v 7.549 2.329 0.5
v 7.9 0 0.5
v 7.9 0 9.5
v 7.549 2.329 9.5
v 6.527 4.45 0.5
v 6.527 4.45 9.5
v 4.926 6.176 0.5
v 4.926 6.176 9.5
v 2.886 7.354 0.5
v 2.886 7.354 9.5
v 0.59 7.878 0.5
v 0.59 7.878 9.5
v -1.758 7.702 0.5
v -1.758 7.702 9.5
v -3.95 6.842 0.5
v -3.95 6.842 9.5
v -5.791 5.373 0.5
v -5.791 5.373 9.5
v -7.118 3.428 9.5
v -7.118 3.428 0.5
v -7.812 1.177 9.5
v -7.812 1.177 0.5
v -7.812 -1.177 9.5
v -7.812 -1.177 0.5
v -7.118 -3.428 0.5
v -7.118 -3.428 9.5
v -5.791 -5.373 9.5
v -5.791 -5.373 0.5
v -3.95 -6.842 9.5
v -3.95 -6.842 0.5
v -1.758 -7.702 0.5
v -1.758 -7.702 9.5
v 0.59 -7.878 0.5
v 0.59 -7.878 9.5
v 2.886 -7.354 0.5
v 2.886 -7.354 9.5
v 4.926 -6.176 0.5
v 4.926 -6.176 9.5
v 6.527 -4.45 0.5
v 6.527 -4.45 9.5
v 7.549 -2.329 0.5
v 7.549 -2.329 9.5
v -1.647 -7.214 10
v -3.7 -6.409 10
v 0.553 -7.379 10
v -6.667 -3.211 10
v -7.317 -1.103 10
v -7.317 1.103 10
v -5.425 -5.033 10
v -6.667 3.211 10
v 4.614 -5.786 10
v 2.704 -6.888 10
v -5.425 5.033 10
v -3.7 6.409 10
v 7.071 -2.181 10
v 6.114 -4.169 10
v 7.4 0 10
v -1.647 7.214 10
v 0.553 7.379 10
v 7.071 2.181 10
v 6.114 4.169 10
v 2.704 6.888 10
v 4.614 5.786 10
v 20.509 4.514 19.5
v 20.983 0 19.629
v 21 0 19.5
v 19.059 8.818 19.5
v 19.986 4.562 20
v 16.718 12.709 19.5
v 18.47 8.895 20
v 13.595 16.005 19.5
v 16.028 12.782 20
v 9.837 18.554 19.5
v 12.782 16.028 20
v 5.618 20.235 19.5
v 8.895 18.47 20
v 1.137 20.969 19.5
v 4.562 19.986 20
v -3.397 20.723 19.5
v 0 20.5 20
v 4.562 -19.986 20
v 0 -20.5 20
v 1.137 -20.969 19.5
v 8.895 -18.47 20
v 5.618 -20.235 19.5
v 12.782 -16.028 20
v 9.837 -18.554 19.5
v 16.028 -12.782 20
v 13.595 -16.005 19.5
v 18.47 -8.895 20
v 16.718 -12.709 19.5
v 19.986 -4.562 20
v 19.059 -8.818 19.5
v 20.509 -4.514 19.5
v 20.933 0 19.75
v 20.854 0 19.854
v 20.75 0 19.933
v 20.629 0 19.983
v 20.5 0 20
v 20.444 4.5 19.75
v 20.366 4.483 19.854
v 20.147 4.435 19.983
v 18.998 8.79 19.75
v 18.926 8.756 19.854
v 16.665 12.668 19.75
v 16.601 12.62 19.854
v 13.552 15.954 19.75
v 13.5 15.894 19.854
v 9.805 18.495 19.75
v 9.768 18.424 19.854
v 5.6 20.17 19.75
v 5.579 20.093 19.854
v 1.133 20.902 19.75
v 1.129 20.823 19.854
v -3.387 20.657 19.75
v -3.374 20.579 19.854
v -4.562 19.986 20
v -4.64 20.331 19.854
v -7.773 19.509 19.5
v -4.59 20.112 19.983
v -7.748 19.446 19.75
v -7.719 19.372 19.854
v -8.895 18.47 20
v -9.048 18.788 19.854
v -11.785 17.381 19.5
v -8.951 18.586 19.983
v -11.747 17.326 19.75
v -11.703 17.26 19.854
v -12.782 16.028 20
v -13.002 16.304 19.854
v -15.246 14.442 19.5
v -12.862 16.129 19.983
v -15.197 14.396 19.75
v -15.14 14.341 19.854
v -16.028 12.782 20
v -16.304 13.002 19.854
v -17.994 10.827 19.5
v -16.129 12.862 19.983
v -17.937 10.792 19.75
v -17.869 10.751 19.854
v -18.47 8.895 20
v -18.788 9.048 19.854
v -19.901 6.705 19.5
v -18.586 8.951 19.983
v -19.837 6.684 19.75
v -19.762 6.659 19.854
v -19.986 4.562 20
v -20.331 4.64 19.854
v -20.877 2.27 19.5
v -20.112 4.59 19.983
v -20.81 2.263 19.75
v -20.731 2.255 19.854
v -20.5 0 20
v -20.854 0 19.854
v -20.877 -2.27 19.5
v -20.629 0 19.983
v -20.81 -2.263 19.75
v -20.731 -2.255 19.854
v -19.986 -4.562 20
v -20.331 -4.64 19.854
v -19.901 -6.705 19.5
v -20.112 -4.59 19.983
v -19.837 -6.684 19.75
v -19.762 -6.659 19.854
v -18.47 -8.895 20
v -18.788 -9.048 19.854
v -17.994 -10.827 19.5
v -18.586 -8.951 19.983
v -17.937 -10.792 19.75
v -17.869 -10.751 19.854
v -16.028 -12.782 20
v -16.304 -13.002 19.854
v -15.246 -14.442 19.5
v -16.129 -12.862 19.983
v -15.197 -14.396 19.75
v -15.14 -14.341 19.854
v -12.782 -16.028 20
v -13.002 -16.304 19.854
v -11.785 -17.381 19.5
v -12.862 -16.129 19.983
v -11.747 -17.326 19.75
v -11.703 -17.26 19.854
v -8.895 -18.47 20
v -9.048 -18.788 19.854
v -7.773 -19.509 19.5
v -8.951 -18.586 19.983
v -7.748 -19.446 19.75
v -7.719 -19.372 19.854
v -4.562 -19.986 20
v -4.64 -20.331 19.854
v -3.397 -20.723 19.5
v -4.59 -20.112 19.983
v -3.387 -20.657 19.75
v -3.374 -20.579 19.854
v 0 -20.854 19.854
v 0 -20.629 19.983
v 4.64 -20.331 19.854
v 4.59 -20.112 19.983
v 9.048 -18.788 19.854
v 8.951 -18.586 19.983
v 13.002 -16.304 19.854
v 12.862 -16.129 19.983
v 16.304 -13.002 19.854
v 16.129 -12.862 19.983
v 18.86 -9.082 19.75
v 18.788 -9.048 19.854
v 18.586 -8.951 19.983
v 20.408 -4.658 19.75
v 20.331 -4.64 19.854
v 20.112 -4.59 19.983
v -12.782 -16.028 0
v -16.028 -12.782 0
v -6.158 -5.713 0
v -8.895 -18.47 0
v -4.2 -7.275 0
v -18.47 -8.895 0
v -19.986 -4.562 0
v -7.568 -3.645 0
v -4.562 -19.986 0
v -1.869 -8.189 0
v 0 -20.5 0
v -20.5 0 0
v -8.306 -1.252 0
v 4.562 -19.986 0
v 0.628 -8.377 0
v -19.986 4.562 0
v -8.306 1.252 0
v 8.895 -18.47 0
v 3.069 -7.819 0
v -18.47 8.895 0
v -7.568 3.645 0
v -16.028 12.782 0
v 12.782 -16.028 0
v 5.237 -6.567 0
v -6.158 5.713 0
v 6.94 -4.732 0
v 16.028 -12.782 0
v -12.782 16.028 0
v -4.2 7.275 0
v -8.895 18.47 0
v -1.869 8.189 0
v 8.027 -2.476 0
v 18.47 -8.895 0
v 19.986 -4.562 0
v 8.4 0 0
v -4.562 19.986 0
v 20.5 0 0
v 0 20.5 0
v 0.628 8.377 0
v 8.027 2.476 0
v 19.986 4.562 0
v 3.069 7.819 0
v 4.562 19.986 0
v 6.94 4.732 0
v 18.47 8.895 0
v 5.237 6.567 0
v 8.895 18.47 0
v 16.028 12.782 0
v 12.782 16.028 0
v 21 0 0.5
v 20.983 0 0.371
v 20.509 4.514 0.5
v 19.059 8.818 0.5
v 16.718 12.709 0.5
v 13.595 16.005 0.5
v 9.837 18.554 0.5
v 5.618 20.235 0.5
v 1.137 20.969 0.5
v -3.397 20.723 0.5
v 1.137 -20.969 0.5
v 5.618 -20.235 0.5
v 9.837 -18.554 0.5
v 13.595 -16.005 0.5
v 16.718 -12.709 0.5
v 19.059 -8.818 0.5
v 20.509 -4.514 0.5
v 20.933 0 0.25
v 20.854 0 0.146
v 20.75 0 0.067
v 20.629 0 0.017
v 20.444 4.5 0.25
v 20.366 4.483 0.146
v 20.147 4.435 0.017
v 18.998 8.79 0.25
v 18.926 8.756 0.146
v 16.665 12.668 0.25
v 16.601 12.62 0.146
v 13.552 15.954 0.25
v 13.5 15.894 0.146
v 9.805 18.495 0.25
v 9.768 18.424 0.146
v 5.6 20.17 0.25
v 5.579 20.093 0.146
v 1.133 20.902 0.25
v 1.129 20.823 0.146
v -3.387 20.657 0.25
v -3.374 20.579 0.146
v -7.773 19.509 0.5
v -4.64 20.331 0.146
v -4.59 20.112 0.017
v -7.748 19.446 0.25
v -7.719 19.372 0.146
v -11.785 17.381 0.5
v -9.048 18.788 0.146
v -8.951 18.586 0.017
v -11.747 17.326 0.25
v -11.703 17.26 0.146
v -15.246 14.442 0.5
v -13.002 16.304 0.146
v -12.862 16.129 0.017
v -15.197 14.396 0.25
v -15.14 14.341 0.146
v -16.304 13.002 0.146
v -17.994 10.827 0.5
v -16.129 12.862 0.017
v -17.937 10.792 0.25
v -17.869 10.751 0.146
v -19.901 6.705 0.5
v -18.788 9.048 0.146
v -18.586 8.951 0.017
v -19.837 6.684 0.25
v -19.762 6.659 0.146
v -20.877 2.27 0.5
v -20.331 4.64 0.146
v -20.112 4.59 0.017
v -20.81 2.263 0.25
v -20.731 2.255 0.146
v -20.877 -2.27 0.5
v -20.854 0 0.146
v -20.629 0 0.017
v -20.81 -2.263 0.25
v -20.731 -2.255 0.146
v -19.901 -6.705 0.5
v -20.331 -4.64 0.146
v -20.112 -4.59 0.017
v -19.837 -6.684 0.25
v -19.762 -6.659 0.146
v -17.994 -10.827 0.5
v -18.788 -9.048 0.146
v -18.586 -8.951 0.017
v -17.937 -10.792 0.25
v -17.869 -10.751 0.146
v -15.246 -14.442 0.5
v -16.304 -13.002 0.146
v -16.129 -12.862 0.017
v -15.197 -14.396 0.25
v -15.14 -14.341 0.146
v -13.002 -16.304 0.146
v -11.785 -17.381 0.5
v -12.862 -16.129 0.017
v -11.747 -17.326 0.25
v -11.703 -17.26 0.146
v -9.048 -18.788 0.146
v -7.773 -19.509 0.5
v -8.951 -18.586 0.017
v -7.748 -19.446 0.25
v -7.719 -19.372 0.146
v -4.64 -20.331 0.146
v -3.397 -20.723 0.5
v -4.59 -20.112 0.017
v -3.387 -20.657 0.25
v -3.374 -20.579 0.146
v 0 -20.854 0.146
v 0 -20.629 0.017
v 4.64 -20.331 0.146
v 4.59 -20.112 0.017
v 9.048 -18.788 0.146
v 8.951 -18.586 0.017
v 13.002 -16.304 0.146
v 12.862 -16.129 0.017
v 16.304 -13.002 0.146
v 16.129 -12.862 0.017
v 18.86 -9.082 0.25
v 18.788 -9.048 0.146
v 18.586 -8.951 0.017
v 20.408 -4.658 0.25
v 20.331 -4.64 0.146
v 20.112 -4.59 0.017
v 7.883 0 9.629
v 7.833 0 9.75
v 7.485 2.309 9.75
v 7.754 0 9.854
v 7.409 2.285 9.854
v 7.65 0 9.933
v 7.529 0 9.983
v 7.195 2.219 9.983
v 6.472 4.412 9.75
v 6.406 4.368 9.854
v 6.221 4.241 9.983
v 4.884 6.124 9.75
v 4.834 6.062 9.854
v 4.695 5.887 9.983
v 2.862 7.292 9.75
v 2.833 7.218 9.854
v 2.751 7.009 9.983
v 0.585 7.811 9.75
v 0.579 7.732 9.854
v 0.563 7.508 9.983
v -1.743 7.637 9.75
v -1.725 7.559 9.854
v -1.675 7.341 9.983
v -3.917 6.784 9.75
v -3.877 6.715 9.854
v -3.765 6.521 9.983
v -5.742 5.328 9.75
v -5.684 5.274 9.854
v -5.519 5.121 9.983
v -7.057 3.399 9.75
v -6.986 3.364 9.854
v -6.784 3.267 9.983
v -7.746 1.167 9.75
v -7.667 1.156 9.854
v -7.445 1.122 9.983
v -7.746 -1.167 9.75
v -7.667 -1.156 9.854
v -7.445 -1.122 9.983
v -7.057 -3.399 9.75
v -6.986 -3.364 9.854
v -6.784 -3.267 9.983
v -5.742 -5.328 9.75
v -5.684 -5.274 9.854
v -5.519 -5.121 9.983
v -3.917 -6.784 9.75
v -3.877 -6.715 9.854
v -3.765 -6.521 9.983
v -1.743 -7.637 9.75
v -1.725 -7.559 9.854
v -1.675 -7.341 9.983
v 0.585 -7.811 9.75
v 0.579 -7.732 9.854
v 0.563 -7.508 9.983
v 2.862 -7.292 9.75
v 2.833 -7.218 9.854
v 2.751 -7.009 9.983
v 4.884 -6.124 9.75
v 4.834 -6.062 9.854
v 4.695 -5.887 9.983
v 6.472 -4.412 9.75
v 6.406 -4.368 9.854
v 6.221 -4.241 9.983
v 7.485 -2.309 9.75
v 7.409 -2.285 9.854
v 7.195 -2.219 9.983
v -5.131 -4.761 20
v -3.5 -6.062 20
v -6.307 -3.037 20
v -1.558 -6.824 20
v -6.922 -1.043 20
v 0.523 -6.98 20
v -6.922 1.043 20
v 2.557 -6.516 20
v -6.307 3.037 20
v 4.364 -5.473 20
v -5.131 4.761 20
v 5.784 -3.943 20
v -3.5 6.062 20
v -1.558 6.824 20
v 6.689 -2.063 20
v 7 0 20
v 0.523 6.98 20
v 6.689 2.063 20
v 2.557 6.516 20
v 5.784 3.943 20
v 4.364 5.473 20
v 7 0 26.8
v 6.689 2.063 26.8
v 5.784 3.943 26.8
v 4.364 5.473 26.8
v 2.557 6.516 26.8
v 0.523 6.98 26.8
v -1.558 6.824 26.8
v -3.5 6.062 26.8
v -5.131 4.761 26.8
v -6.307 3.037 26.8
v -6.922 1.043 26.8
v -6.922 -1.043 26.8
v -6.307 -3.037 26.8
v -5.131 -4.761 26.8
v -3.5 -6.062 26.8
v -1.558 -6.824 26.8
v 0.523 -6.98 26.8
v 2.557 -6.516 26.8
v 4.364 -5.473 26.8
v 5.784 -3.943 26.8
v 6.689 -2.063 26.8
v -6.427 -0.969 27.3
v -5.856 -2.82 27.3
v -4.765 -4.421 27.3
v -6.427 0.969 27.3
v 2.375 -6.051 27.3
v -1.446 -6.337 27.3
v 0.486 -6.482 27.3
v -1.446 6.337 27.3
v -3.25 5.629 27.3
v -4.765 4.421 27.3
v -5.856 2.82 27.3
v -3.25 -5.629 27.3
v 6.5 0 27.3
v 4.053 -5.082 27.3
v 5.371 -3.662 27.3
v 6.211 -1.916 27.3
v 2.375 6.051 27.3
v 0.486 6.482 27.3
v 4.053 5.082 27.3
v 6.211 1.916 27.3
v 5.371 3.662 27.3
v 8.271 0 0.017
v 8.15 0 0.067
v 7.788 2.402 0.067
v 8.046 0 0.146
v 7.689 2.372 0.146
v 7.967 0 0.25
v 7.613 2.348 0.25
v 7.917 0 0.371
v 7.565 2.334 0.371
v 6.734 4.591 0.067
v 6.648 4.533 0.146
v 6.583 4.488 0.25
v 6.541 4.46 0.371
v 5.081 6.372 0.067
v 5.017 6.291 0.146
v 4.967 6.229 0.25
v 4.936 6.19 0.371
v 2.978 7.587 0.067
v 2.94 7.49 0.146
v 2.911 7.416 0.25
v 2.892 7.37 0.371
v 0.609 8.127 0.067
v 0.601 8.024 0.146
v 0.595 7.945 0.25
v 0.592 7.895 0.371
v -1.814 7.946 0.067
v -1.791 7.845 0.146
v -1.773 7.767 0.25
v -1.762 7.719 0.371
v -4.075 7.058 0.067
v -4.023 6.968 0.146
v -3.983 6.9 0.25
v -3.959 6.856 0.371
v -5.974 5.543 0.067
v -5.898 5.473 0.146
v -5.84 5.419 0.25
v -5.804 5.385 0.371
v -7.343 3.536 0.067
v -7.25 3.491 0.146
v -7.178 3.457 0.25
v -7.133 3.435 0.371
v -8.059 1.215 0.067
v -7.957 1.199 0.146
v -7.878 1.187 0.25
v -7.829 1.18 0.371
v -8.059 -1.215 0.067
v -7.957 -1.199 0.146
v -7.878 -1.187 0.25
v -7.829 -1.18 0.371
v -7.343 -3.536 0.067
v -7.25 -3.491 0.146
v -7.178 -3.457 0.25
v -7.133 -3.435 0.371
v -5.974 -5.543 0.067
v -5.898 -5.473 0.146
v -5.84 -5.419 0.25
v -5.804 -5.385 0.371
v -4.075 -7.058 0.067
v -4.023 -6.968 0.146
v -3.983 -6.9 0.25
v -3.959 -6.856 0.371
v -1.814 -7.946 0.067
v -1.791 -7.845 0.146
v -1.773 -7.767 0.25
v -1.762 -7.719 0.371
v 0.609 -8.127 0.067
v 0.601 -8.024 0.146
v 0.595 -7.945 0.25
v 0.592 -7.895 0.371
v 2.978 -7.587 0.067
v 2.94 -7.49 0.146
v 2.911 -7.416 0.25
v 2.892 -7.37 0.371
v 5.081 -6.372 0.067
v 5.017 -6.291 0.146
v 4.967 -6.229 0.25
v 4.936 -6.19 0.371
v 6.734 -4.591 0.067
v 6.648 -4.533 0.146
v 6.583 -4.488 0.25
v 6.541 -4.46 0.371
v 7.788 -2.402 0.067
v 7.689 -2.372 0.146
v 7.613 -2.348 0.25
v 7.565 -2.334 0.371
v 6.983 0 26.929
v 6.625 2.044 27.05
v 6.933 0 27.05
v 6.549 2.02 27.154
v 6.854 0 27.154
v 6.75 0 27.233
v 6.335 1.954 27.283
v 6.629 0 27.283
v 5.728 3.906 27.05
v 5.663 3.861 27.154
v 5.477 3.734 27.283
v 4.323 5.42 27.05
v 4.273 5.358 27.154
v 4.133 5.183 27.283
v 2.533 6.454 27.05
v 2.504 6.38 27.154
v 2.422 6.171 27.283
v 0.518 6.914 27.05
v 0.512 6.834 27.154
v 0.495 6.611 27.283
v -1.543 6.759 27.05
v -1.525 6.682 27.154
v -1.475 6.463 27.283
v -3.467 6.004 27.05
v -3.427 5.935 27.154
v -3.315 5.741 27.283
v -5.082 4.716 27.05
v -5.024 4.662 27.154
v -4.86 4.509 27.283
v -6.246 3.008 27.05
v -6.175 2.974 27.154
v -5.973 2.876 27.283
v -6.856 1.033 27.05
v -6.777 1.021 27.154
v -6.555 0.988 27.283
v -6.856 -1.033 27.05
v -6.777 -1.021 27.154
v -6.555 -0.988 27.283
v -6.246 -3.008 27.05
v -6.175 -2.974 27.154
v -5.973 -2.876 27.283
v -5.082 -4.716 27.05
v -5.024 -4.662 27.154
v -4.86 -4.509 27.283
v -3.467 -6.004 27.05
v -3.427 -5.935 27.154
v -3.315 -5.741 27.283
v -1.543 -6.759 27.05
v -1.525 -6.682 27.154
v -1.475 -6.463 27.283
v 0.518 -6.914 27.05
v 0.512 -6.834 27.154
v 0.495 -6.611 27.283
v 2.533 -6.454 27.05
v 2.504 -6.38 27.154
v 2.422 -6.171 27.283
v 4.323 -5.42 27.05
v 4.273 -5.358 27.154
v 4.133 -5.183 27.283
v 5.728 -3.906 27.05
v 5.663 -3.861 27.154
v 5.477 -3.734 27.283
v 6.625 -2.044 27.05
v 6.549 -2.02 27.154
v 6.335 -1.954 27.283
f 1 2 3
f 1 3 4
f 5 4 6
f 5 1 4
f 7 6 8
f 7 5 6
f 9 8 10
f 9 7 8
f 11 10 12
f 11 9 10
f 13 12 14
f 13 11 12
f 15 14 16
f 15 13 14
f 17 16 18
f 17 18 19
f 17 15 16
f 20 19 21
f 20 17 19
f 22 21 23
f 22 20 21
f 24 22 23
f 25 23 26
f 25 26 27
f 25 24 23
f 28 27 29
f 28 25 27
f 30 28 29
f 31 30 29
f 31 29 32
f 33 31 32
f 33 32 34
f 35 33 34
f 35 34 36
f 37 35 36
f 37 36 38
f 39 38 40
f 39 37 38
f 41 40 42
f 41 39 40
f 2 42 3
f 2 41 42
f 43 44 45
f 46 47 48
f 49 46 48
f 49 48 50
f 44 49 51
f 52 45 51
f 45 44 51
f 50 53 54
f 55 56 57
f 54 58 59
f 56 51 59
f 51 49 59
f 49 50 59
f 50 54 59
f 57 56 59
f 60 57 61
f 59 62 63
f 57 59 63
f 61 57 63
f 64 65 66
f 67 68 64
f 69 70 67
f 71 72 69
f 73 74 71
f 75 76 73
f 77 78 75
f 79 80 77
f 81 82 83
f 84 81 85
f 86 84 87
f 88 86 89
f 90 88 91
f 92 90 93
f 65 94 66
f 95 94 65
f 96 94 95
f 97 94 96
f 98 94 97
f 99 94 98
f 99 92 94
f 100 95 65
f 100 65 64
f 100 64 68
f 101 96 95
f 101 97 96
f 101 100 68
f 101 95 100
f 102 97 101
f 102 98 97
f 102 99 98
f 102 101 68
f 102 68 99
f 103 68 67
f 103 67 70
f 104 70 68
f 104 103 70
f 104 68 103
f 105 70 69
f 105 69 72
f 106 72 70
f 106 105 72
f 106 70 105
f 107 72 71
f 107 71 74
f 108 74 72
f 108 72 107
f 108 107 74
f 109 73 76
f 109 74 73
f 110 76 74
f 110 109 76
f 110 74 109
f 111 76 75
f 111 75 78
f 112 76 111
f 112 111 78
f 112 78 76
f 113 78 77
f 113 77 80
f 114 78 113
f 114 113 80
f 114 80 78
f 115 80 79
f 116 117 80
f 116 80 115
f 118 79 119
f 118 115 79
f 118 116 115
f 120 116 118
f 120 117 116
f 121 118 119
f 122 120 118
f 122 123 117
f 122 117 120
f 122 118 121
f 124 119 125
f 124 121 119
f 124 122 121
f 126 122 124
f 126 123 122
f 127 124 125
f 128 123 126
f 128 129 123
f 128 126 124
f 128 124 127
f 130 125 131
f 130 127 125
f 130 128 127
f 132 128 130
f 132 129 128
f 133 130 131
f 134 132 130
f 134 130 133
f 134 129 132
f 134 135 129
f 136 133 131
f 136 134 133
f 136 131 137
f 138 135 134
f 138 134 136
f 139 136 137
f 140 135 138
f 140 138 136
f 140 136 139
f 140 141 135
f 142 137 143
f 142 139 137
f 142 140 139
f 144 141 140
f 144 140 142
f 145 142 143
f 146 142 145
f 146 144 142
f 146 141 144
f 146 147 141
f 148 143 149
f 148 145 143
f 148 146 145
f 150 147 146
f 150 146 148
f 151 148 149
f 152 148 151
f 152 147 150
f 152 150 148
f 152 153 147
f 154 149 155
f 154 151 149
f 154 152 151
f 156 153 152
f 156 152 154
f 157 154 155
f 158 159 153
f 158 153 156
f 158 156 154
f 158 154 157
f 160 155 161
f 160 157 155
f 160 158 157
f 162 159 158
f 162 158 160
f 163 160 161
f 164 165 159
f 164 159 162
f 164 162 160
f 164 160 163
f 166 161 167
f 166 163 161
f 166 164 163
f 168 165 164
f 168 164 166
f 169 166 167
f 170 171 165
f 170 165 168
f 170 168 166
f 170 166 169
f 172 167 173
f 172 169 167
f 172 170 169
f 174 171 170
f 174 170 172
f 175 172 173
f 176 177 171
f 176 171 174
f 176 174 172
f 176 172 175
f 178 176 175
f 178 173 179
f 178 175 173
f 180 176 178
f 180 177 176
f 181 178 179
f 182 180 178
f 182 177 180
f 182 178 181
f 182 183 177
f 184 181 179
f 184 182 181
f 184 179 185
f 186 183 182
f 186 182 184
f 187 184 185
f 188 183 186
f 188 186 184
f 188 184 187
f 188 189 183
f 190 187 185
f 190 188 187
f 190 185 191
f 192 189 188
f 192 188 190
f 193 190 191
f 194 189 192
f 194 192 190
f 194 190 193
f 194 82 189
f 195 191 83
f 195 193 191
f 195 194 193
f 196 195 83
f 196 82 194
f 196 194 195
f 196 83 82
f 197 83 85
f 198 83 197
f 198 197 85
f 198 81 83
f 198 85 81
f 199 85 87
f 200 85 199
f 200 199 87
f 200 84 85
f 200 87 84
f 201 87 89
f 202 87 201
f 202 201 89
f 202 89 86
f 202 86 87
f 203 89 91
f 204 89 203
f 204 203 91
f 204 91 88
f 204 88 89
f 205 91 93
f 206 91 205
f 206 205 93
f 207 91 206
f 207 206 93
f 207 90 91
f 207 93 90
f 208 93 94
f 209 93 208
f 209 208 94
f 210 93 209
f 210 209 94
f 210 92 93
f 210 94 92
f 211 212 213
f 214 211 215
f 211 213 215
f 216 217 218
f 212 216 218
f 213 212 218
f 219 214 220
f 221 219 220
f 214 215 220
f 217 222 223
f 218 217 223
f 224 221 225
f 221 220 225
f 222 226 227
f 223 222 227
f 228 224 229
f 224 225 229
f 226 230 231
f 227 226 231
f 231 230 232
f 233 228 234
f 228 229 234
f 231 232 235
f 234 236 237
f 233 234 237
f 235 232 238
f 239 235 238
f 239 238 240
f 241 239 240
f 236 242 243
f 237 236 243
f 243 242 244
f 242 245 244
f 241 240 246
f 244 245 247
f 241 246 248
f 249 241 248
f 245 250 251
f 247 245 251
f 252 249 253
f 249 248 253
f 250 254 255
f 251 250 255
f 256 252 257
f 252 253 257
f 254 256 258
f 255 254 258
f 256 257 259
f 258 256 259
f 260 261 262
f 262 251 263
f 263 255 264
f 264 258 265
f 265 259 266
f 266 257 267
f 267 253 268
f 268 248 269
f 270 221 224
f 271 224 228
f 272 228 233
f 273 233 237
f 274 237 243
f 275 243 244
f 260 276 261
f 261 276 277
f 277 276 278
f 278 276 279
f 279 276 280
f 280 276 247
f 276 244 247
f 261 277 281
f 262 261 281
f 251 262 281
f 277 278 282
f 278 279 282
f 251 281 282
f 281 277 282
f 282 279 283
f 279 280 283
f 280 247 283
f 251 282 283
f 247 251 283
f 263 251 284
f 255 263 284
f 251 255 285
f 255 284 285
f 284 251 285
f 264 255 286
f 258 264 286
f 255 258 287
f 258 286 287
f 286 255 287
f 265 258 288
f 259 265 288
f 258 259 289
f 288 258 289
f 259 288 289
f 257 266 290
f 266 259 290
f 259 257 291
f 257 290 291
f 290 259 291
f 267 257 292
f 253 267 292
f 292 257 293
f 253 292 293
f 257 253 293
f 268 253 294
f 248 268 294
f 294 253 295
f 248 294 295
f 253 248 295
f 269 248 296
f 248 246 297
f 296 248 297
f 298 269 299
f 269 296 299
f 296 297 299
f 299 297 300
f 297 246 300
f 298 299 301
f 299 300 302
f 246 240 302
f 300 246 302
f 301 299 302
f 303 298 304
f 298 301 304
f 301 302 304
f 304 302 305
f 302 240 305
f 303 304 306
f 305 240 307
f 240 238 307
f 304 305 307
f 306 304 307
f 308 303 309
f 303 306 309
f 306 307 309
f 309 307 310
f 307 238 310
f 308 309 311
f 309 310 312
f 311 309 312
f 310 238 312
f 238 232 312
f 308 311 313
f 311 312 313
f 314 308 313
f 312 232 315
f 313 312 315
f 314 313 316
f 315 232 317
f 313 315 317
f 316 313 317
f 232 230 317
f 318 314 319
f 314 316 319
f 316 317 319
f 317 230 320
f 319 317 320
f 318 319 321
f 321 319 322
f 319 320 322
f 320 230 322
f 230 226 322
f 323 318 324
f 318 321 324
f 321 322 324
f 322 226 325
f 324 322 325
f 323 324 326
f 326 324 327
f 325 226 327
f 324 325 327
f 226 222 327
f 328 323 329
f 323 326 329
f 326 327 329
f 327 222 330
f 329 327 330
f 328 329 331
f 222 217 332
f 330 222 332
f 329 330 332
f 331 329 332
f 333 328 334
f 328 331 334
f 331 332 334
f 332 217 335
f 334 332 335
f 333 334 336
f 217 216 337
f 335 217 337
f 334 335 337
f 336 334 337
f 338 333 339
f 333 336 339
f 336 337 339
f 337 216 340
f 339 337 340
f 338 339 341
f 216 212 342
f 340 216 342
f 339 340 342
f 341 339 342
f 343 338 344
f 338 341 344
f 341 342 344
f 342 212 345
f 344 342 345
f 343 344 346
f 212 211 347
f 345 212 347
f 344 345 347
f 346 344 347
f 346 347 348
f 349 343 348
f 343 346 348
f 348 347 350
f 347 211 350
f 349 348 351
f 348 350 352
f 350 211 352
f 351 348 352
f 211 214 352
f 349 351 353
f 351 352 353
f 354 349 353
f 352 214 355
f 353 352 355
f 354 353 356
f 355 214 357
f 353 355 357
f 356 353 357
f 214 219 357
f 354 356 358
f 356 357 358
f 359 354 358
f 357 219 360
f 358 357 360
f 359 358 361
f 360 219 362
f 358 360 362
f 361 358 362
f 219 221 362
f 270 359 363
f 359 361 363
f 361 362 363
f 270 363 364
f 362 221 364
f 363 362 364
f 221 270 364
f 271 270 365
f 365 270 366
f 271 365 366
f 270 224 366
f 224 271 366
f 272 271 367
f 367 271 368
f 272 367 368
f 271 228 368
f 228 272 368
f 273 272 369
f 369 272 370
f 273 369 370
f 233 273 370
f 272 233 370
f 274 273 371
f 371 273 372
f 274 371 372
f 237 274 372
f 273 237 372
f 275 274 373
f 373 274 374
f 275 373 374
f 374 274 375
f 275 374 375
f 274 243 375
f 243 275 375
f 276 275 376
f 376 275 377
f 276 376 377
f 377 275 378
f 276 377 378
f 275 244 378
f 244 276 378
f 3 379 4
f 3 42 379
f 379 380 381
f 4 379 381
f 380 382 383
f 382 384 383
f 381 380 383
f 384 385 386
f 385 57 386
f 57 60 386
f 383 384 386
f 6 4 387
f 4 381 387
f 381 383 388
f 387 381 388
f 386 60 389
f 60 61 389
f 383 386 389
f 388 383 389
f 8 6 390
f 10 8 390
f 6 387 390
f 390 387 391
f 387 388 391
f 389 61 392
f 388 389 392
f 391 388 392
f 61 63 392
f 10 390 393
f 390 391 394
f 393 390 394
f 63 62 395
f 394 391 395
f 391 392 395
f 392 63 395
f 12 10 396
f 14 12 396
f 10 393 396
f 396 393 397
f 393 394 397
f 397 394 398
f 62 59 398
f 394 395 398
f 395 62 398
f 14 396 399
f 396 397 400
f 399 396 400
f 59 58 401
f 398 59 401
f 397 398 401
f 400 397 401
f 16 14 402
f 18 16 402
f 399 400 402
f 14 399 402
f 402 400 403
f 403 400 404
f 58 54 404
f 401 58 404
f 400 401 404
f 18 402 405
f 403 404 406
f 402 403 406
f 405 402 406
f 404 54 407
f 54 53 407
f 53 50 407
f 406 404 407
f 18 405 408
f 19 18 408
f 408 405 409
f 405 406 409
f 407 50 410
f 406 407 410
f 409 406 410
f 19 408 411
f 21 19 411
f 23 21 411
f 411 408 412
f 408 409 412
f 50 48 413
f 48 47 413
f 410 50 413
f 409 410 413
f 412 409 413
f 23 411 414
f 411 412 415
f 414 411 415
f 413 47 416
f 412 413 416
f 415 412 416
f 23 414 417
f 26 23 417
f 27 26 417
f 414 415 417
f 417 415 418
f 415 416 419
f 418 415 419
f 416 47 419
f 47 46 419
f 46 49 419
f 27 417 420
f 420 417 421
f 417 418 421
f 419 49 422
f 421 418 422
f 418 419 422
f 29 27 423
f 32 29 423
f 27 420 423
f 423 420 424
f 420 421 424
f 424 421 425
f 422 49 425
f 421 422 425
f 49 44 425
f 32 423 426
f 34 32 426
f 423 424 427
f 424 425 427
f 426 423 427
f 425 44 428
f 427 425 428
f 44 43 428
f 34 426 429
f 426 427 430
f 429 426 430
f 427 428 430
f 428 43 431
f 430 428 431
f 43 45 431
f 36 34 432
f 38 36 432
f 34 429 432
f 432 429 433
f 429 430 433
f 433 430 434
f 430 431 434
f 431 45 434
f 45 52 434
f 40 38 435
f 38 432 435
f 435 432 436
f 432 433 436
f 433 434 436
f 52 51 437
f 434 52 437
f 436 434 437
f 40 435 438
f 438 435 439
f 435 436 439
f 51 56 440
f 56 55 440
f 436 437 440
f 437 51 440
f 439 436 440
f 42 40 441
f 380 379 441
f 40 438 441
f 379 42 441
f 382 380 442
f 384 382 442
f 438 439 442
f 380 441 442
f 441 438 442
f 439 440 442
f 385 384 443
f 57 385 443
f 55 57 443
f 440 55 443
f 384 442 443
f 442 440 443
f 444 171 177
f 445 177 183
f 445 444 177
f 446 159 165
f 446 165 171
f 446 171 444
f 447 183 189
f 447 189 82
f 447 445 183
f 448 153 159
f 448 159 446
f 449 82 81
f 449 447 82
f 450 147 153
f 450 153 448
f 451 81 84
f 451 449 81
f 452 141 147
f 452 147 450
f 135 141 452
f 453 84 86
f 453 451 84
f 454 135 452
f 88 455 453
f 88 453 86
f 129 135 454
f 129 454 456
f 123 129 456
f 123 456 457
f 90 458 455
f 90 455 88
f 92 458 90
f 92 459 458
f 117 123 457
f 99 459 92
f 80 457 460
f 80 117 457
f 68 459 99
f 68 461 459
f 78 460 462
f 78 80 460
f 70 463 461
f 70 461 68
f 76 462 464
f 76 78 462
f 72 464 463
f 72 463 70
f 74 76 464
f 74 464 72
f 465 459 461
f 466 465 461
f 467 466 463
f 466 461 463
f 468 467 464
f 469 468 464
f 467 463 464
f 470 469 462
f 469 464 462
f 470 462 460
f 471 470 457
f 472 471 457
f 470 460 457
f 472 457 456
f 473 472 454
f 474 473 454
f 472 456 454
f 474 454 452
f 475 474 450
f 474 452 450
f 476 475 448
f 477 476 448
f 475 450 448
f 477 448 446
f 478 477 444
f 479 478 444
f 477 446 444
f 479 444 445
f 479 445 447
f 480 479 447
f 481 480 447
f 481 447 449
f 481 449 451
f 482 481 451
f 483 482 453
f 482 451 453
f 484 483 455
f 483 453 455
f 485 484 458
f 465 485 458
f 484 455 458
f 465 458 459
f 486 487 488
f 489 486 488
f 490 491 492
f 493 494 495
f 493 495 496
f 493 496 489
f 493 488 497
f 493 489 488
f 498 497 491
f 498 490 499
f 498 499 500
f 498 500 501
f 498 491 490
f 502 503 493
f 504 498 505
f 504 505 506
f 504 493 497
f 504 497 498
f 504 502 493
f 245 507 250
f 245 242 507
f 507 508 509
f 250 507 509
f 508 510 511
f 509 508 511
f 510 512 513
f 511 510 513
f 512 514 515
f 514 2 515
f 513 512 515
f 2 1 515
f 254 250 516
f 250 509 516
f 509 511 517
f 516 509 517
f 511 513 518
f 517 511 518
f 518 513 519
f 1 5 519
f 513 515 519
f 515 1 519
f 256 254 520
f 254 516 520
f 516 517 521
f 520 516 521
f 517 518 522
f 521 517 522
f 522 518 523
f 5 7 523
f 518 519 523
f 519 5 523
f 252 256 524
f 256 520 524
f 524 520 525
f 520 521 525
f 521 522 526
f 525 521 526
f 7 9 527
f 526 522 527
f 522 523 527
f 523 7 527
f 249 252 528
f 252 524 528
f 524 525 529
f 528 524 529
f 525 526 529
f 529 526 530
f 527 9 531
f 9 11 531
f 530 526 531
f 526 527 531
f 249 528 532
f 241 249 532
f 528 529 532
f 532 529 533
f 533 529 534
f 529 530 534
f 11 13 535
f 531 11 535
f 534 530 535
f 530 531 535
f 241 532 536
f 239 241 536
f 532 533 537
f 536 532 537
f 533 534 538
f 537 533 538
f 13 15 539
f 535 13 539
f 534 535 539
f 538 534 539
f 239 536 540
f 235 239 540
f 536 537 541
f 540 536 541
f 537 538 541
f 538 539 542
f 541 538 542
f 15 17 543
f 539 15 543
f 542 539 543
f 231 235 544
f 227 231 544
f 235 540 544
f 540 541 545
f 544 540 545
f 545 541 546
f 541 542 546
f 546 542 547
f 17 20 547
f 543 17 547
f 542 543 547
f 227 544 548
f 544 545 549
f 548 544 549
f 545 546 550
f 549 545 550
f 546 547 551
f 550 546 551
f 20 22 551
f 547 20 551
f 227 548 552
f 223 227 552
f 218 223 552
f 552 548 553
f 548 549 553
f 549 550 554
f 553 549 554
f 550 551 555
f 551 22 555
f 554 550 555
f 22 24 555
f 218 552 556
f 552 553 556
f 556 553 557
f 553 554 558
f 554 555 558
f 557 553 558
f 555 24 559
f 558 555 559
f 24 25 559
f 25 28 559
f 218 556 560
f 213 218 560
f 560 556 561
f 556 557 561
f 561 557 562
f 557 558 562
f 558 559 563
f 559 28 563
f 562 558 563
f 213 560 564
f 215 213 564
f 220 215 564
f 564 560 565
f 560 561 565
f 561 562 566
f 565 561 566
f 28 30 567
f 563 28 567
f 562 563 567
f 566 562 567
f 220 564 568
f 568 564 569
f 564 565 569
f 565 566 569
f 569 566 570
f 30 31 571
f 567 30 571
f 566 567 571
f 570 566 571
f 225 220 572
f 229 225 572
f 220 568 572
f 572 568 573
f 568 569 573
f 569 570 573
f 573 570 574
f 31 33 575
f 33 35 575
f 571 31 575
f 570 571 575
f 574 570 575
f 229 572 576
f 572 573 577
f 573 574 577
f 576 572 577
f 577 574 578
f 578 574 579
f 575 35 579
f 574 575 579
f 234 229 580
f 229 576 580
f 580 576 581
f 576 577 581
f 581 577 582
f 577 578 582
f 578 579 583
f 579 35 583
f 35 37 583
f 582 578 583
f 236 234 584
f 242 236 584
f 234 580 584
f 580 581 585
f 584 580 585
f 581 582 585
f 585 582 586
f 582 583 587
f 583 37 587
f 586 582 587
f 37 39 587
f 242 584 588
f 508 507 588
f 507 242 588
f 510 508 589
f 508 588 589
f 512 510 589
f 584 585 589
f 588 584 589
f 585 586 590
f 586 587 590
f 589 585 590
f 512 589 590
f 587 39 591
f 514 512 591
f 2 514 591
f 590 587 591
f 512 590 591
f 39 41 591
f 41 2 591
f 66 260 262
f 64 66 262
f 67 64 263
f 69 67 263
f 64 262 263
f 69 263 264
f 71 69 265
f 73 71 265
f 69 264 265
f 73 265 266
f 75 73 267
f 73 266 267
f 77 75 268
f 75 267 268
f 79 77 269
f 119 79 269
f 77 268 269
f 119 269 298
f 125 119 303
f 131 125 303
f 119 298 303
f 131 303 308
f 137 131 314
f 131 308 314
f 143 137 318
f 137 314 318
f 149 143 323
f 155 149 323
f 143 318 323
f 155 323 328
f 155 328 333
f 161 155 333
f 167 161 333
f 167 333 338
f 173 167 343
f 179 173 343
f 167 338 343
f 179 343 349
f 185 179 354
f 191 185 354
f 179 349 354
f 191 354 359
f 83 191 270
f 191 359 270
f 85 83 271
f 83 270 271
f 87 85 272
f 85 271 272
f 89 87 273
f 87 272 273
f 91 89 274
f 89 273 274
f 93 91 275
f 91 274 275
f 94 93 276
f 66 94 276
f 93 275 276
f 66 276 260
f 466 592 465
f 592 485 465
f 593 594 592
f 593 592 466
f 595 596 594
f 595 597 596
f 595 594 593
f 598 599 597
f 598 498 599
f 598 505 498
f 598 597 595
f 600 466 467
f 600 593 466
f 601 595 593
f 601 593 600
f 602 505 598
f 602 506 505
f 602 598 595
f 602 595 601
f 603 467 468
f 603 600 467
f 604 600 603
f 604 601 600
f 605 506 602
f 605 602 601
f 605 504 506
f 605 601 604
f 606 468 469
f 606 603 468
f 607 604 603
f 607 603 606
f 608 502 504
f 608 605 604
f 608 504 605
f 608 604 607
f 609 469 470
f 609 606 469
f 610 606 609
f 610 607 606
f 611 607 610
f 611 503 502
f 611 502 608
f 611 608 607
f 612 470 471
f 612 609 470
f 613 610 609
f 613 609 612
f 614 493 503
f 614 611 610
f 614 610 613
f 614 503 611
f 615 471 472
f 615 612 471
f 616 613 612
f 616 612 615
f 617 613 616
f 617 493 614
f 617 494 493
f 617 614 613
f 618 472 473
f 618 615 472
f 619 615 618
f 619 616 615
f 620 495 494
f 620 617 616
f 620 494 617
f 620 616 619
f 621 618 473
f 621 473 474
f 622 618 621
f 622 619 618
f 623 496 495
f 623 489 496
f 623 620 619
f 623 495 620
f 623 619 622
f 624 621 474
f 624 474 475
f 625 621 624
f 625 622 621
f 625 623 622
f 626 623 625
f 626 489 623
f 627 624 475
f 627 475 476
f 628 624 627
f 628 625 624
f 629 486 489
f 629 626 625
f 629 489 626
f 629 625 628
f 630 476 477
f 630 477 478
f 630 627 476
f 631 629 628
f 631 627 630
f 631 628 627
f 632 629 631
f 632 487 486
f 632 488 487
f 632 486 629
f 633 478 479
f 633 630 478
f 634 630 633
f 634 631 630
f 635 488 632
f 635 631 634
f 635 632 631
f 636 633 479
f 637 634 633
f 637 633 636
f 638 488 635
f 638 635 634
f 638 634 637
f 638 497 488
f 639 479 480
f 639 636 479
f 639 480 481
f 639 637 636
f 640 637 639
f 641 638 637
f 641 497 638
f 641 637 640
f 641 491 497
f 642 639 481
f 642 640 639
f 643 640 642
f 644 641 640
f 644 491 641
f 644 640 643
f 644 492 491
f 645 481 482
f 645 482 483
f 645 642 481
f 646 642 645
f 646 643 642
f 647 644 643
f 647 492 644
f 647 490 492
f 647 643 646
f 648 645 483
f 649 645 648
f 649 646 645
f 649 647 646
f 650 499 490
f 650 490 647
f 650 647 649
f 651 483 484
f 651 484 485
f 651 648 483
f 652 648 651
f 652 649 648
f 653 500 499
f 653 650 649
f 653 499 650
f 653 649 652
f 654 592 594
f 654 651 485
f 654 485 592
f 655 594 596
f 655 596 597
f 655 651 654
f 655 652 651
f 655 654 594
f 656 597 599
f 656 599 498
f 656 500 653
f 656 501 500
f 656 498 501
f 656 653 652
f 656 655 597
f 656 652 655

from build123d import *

# Parameters (mm, degrees)
F4_R     = 21
F5_DEPTH = 20
F6_R     = 7.9
F7_DEPTH = 10
F8_R     = 7
F9_DEPTH = 7.3
F10_R    = 0.5


with BuildPart() as f5:
    # F4 (on Top) → F5 (new body)
    with BuildSketch(Plane.XY):
        Circle(F4_R)
    extrude(amount=F5_DEPTH)

    # F6 (on Top) → F7 (cut)
    with BuildSketch(Plane.XY):
        Circle(F6_R)
    extrude(amount=F7_DEPTH, mode=Mode.SUBTRACT)

    # F8 (on face) → F9 (join)
    with BuildSketch(Plane.XY.offset(20)):
        Circle(F8_R)
    extrude(amount=F9_DEPTH)

    # F10
    f10_edges = [f5.edges().sort_by_distance(p)[0] for p in [
        (-7, 0, 27.3),
        (-21, 0, 20),
        (-21, 0, 0),
        (-7.9, 0, 0),
        (-7.9, 0, 10),
    ]]
    fillet(f10_edges, radius=F10_R)


solid = f5.part
